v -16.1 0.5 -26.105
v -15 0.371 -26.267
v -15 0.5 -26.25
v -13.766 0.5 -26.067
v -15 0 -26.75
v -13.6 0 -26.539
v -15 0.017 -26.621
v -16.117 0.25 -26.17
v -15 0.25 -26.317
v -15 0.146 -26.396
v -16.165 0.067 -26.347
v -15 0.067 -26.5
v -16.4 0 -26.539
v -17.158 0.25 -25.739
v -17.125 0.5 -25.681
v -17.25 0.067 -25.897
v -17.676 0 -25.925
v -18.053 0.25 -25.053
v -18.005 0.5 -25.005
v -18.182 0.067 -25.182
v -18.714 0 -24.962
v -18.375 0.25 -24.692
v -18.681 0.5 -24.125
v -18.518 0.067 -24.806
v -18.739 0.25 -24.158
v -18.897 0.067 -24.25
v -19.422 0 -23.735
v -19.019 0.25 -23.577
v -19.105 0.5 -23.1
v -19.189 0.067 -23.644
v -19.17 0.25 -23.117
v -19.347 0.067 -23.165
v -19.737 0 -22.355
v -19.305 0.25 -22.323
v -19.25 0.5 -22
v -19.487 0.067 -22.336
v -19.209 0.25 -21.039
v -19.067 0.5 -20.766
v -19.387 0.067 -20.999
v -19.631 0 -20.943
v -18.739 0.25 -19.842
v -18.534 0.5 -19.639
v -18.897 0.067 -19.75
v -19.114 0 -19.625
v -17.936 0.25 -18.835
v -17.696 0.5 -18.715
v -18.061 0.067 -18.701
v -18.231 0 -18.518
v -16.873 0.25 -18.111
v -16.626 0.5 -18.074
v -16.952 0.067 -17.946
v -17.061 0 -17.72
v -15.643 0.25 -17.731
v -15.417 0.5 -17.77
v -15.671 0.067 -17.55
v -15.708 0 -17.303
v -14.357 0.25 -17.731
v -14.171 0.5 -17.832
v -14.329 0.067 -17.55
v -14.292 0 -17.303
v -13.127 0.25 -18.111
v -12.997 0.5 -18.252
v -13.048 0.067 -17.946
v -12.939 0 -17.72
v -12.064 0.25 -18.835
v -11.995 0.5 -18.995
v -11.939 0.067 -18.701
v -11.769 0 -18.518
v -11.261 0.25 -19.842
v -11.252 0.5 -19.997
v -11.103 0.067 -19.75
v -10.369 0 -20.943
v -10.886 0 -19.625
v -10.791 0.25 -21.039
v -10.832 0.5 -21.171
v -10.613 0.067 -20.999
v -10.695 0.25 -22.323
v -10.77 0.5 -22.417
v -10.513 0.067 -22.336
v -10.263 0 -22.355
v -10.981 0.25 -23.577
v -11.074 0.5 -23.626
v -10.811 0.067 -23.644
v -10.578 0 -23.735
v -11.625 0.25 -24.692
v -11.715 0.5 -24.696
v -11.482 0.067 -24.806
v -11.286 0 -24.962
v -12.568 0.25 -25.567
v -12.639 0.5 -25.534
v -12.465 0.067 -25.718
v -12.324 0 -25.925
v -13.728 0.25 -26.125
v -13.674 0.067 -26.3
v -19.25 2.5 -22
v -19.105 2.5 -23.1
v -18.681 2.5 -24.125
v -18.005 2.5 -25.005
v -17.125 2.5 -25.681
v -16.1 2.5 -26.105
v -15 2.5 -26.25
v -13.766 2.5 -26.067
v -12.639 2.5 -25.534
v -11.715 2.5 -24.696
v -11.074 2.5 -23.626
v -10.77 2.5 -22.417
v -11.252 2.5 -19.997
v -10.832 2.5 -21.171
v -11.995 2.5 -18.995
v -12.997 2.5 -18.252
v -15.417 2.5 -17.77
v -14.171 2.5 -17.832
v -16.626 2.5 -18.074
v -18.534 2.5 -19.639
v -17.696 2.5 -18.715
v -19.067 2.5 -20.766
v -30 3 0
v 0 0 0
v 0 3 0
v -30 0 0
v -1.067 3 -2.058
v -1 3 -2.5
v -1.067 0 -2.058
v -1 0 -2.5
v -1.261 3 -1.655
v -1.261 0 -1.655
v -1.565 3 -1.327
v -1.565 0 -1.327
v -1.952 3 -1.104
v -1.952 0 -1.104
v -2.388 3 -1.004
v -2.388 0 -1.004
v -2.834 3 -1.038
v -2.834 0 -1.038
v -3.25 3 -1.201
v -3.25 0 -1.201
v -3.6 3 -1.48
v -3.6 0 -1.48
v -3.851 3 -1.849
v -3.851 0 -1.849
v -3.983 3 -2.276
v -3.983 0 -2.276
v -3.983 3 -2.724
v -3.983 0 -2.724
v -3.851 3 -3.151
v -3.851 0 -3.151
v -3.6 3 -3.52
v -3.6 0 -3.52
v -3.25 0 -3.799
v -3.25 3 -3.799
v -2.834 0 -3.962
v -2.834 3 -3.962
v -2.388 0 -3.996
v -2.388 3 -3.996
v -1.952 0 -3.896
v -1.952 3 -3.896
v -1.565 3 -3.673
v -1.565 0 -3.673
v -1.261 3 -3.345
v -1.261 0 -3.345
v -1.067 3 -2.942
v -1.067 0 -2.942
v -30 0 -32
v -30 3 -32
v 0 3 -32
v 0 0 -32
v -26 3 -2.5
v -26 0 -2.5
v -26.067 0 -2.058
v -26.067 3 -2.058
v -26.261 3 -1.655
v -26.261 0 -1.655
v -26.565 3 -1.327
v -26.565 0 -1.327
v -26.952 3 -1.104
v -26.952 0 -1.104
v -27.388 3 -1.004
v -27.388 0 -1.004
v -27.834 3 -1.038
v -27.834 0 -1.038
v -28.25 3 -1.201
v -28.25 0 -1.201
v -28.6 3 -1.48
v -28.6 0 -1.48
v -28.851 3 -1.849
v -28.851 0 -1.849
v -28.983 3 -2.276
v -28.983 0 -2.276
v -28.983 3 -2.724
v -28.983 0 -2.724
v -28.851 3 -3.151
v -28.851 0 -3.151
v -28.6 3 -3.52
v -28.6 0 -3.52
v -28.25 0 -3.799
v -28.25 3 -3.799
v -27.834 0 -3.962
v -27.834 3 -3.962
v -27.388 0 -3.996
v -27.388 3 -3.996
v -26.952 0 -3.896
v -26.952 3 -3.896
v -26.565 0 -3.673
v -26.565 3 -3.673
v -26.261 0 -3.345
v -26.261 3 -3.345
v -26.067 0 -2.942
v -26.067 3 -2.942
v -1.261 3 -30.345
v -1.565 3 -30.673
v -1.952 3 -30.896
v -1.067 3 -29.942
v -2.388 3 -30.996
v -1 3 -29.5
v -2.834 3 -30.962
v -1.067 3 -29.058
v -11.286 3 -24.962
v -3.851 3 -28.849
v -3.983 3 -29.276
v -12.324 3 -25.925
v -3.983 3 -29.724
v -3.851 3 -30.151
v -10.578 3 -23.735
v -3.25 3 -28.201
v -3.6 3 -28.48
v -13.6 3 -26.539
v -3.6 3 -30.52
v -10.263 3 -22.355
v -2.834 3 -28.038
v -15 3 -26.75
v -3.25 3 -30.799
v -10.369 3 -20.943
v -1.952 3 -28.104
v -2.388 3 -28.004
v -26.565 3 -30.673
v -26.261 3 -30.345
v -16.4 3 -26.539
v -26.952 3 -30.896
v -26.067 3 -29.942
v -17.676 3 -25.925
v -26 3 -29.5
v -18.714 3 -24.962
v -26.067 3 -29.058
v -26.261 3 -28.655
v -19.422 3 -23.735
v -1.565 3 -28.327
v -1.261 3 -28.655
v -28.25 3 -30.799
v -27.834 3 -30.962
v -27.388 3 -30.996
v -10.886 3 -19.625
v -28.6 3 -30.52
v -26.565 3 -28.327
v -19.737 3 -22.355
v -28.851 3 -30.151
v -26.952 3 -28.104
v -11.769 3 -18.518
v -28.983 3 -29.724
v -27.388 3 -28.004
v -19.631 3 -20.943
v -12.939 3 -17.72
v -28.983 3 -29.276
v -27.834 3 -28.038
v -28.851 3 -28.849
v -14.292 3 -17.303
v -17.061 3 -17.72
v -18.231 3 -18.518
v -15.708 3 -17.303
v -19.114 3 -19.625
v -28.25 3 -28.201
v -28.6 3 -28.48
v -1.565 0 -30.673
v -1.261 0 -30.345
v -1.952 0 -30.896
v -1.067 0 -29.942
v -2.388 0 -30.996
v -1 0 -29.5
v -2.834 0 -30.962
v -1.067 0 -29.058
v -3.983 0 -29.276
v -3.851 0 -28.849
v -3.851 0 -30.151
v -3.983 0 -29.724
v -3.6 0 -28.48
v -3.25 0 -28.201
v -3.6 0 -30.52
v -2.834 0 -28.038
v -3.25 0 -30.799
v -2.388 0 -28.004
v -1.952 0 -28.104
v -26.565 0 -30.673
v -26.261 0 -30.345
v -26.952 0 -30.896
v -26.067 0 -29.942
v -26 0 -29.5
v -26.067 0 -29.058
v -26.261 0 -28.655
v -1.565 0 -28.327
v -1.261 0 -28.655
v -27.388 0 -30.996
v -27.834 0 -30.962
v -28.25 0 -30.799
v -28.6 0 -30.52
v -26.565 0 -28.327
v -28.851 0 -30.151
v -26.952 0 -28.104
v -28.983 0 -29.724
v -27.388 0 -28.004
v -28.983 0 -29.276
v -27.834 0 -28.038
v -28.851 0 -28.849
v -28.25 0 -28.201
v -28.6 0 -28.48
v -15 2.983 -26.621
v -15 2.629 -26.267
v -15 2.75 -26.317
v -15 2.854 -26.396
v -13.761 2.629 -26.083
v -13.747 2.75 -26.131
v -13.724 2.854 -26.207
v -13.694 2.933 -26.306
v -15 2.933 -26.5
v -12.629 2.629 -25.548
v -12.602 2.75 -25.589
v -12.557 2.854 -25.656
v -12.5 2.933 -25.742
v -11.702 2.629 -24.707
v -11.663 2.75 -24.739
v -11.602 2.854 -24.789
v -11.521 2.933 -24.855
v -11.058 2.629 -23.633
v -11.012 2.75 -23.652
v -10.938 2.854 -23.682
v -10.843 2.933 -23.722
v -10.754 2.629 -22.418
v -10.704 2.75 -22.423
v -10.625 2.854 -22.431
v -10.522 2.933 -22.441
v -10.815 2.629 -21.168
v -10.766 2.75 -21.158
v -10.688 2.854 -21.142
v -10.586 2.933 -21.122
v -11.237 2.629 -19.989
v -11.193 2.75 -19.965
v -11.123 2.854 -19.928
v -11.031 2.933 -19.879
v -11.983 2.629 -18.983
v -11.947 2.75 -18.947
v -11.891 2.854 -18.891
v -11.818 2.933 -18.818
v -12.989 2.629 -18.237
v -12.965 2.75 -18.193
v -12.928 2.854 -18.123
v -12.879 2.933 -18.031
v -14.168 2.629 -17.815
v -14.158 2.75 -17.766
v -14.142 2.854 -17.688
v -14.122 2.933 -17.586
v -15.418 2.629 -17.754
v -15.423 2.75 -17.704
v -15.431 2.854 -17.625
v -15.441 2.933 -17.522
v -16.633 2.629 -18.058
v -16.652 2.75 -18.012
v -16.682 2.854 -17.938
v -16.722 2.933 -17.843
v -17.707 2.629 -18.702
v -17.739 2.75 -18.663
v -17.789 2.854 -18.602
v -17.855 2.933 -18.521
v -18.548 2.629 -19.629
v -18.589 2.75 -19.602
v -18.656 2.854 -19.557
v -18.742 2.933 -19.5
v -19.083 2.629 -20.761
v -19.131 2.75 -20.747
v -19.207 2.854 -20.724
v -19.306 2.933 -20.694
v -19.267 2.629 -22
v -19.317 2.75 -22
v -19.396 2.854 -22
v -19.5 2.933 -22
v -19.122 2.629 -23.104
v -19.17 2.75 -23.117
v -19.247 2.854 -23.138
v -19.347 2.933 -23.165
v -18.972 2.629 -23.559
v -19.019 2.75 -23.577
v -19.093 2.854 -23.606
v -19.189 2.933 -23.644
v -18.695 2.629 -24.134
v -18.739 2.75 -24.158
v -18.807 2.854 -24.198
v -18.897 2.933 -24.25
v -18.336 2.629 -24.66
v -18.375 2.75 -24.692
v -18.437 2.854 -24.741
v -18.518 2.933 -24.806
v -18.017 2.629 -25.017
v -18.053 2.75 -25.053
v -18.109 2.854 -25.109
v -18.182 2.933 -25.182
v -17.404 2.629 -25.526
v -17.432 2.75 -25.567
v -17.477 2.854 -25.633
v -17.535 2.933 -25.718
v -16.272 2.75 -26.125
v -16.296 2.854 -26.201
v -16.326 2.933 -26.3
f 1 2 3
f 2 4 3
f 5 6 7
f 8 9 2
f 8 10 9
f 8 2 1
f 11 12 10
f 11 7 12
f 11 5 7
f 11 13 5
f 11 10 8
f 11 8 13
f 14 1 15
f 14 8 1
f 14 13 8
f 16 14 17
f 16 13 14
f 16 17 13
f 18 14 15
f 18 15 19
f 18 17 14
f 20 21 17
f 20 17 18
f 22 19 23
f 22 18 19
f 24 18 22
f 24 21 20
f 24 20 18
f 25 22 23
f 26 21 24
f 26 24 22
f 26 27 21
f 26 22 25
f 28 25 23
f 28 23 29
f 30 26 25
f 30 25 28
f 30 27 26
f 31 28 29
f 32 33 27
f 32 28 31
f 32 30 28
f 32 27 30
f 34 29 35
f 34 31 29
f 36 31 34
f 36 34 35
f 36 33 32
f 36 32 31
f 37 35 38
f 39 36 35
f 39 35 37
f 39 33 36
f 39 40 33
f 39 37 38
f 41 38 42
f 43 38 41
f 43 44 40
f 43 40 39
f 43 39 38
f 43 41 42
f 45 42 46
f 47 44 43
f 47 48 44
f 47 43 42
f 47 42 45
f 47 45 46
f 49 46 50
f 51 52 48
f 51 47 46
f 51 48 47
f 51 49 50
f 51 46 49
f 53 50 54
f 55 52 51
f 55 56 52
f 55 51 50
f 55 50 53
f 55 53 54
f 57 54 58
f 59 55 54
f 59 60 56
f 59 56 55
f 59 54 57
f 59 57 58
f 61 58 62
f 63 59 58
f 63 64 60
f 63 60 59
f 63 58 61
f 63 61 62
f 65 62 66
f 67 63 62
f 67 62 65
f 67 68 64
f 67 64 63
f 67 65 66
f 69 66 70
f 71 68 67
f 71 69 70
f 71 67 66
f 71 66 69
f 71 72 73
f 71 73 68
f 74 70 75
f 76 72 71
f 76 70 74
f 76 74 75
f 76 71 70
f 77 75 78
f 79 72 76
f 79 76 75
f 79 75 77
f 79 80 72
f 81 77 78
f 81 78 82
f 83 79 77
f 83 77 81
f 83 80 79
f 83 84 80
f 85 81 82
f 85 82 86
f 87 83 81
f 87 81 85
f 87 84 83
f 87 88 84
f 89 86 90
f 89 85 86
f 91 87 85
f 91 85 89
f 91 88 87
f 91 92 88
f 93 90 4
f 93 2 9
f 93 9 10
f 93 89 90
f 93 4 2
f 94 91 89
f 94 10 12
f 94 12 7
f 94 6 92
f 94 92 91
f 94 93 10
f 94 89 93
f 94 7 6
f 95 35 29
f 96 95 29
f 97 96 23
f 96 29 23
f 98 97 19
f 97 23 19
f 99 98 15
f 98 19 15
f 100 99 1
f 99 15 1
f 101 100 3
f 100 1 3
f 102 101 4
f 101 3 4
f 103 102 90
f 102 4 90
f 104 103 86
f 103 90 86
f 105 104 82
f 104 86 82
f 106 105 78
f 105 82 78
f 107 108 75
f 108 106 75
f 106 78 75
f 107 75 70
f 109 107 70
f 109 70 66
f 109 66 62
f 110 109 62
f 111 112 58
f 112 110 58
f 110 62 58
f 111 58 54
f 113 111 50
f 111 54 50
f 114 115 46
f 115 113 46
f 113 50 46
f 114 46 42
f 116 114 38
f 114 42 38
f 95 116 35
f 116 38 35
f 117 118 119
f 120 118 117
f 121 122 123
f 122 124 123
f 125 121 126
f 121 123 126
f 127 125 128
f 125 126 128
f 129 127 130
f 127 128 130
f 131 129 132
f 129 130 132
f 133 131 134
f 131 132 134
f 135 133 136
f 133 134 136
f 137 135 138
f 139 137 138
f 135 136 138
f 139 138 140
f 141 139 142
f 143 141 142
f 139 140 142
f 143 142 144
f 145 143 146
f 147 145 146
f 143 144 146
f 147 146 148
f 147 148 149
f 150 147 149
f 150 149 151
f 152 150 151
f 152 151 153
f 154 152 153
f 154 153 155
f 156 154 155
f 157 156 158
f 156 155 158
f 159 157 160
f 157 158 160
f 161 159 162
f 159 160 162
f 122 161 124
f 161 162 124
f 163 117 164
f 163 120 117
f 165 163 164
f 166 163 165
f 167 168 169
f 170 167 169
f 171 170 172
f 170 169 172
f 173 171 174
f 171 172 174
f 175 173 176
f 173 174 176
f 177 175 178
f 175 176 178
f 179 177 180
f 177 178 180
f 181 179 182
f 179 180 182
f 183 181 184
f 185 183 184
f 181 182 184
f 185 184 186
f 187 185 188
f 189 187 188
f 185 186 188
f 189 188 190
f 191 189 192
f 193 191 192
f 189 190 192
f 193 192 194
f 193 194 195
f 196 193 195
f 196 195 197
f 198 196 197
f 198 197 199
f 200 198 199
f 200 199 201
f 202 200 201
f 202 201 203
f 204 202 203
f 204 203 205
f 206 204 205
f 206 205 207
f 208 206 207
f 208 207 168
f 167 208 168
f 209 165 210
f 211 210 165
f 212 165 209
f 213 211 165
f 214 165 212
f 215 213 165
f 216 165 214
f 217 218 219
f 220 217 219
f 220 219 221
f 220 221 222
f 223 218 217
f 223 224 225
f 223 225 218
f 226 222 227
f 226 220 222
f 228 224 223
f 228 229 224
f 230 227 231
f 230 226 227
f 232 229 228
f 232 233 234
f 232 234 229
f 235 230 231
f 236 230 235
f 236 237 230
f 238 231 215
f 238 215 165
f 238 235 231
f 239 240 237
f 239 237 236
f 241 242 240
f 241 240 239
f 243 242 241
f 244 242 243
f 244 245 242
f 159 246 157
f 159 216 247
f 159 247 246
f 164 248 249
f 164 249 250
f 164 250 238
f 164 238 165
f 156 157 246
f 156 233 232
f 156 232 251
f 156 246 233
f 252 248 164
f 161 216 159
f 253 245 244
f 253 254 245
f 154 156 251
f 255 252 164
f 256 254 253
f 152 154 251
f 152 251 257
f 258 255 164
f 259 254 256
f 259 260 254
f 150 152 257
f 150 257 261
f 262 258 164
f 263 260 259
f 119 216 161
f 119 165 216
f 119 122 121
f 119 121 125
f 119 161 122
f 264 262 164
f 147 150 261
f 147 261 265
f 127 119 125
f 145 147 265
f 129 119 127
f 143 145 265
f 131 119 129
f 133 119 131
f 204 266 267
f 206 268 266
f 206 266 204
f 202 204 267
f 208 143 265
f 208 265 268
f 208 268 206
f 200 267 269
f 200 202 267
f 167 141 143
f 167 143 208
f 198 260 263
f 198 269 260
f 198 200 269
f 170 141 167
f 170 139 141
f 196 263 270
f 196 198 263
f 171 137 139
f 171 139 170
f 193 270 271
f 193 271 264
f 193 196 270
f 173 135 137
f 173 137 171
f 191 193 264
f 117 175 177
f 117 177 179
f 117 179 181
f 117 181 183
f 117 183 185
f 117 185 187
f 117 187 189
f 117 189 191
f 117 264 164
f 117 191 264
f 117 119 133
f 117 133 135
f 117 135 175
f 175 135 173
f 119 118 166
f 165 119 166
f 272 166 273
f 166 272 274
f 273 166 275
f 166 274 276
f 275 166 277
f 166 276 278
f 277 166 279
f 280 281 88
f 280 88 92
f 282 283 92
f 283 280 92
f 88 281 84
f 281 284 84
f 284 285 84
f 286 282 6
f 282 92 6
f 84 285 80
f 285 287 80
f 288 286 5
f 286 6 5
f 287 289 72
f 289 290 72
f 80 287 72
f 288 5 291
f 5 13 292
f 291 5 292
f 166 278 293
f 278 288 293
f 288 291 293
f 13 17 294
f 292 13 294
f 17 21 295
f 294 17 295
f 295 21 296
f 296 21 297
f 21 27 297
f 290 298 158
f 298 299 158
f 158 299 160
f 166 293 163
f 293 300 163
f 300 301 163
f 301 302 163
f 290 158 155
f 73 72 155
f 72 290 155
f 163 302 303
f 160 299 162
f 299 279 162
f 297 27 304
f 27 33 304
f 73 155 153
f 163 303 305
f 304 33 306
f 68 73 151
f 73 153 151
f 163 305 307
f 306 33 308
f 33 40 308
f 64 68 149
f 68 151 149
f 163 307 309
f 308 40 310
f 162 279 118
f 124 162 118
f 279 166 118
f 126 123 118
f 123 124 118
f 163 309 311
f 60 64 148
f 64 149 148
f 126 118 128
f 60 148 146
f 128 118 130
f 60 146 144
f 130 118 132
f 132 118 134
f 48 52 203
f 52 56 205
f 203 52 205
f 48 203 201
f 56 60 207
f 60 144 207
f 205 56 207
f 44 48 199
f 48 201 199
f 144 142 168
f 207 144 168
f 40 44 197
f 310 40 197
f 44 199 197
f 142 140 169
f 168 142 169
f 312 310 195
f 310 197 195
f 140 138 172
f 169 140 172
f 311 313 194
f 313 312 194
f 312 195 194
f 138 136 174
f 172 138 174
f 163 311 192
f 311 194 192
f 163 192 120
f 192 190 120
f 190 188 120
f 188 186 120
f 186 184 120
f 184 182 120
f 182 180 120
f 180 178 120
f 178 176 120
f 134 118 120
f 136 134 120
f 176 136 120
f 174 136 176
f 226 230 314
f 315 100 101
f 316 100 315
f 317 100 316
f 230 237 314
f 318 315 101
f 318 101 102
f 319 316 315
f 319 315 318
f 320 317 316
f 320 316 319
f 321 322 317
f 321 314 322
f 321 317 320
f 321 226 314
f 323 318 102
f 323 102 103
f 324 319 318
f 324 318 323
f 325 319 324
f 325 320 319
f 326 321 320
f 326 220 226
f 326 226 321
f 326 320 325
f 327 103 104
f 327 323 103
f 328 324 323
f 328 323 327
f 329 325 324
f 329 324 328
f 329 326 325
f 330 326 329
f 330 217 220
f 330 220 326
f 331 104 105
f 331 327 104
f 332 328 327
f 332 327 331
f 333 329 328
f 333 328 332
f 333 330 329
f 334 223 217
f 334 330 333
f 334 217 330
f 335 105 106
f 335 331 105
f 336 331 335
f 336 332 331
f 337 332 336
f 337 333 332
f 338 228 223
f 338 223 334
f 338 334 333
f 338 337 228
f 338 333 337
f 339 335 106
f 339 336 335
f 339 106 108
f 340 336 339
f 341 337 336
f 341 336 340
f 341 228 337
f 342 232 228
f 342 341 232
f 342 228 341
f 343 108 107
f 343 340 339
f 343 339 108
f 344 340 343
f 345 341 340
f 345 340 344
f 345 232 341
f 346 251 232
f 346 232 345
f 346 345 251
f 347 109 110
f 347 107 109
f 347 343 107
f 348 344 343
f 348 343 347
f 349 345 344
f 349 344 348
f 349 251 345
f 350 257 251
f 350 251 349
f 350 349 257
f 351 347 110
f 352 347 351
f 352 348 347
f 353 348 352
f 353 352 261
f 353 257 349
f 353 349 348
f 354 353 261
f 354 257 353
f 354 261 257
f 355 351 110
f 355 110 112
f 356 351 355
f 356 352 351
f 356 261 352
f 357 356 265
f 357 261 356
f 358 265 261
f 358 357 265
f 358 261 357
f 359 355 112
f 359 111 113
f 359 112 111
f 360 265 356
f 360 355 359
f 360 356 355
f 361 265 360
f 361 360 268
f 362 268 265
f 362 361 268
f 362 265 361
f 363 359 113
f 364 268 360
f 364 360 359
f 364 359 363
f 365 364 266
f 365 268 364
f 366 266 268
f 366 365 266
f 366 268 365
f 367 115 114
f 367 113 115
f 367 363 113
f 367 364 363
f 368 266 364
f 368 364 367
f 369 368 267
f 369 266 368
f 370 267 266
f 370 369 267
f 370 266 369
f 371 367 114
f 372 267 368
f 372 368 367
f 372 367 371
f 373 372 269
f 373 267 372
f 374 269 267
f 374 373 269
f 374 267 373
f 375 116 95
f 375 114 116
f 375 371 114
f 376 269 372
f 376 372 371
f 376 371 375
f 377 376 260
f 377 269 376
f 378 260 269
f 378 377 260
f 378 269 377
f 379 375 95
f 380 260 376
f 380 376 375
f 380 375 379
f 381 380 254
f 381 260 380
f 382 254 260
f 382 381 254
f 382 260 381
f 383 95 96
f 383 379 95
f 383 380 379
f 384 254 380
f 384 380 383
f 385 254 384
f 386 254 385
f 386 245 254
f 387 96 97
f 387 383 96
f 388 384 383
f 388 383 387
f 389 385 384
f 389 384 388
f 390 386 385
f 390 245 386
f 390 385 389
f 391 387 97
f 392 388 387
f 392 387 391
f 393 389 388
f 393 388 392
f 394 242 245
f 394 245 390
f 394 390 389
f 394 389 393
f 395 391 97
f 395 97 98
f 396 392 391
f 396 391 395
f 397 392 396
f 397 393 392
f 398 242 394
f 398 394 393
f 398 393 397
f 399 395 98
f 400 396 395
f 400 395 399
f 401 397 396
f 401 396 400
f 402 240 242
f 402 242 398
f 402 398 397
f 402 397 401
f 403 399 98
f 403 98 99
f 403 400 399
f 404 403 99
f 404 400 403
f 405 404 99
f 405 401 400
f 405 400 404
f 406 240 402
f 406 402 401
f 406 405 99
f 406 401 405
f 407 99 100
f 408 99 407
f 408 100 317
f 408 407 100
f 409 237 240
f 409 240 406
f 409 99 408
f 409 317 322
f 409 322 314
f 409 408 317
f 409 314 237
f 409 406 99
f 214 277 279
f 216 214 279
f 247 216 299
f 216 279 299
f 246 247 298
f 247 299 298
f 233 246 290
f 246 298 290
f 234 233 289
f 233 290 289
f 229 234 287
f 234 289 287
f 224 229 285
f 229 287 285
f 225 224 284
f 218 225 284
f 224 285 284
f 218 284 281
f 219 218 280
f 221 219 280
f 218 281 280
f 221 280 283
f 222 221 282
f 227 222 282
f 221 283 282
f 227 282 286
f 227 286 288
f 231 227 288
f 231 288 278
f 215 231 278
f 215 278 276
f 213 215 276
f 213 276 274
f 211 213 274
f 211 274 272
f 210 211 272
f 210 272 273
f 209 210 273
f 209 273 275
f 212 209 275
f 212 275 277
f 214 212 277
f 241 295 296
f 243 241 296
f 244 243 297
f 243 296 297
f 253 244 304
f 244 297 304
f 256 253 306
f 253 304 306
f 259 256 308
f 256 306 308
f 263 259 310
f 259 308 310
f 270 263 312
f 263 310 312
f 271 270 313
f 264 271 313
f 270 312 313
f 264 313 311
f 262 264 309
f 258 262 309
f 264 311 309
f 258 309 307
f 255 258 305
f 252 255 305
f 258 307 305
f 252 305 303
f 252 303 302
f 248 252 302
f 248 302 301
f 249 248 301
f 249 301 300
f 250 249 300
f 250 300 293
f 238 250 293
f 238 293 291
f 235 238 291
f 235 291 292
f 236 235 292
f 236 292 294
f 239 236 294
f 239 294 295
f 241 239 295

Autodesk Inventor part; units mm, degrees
ref_plane "YZ Plane" through (0, 0, 0) normal (1, 0, 0) x (0, 1, 0)
ref_plane "XZ Plane" through (0, 0, 0) normal (0, 1, 0) x (-1, 0, 0)
ref_plane "XY Plane" through (0, 0, 0) normal (0, 0, 1) x (1, 0, 0)
sketch "Boceto1" plane through (0, 0, 0) normal (0, 1, 0) x (-1, 0, 0)
  line L0 (0, 0) -> (30, 0)
  line L1 (30, 0) -> (30, -10)
  line L2 (30, -10) -> (30, -10)
  line L3 (30, -10) -> (30, -22)
  line L4 (30, -22) -> (30, -22)
  line L5 (30, -22) -> (30, -32)
  line L6 (30, -32) -> (0, -32)
  line L7 (0, -32) -> (0, -22)
  line L8 (0, -22) -> (0, -22)
  line L9 (0, -22) -> (0, -10)
  line L10 (0, -10) -> (0, -10)
  line L11 (0, 0) -> (0, -10)
  line L12 (15, -32) -> (15, -22)
  circle A0 centre (15, -22) radius 4.25
  dimension "d0" = 30
  dimension "d1" = 10
  dimension "d2" = 0
  dimension "d3" = 12
  dimension "d4" = 10
  dimension "d5" = 10
  dimension "d6" = 0
  dimension "d10" = 8.5
extrude "Extrusión2" add sketch "Boceto1" along normal blind 3
fillet "Empalme1" radius 0.5 2 edges at (-10.75, 3, -22) (-10.75, 0, -22)
sketch "Sketch4" plane through (0, 0, 0) normal (0, -1, 0) x (1, 0, 0)
  line L0 (-30, 0) -> (-27.5, 0)
  line L1 (-30, 0) -> (0, 0) projected
  line L2 (-27.5, 0) -> (-27.5, -2.5)
  line L3 (0, 0) -> (-2.5, 0)
  line L4 (-2.5, 0) -> (-2.5, -2.5)
  line L5 (0, -32) -> (-2.5, -32)
  line L6 (0, -32) -> (-30, -32) projected
  line L7 (-2.5, -32) -> (-2.5, -29.5)
  line L8 (-30, -32) -> (-27.5, -32)
  line L9 (-27.5, -32) -> (-27.5, -29.5)
  circle A0 centre (-27.5, -2.5) radius 1.5
  circle A1 centre (-2.5, -2.5) radius 1.5
  circle A2 centre (-2.5, -29.5) radius 1.5
  circle A3 centre (-27.5, -29.5) radius 1.5
  dimension "d20" = 2.5
  dimension "d21" = 2.5
  dimension "d22" = 2.5
  dimension "d23" = 2.5
  dimension "d24" = 2.5
  dimension "d25" = 2.5
  dimension "d26" = 2.5
  dimension "d27" = 2.5
  dimension "d28" = 3
  dimension "d29" = 3
  dimension "d30" = 3
  dimension "d31" = 3
extrude "Extrusion4" cut sketch "Sketch4" against normal through all
properties part number "core_case"
